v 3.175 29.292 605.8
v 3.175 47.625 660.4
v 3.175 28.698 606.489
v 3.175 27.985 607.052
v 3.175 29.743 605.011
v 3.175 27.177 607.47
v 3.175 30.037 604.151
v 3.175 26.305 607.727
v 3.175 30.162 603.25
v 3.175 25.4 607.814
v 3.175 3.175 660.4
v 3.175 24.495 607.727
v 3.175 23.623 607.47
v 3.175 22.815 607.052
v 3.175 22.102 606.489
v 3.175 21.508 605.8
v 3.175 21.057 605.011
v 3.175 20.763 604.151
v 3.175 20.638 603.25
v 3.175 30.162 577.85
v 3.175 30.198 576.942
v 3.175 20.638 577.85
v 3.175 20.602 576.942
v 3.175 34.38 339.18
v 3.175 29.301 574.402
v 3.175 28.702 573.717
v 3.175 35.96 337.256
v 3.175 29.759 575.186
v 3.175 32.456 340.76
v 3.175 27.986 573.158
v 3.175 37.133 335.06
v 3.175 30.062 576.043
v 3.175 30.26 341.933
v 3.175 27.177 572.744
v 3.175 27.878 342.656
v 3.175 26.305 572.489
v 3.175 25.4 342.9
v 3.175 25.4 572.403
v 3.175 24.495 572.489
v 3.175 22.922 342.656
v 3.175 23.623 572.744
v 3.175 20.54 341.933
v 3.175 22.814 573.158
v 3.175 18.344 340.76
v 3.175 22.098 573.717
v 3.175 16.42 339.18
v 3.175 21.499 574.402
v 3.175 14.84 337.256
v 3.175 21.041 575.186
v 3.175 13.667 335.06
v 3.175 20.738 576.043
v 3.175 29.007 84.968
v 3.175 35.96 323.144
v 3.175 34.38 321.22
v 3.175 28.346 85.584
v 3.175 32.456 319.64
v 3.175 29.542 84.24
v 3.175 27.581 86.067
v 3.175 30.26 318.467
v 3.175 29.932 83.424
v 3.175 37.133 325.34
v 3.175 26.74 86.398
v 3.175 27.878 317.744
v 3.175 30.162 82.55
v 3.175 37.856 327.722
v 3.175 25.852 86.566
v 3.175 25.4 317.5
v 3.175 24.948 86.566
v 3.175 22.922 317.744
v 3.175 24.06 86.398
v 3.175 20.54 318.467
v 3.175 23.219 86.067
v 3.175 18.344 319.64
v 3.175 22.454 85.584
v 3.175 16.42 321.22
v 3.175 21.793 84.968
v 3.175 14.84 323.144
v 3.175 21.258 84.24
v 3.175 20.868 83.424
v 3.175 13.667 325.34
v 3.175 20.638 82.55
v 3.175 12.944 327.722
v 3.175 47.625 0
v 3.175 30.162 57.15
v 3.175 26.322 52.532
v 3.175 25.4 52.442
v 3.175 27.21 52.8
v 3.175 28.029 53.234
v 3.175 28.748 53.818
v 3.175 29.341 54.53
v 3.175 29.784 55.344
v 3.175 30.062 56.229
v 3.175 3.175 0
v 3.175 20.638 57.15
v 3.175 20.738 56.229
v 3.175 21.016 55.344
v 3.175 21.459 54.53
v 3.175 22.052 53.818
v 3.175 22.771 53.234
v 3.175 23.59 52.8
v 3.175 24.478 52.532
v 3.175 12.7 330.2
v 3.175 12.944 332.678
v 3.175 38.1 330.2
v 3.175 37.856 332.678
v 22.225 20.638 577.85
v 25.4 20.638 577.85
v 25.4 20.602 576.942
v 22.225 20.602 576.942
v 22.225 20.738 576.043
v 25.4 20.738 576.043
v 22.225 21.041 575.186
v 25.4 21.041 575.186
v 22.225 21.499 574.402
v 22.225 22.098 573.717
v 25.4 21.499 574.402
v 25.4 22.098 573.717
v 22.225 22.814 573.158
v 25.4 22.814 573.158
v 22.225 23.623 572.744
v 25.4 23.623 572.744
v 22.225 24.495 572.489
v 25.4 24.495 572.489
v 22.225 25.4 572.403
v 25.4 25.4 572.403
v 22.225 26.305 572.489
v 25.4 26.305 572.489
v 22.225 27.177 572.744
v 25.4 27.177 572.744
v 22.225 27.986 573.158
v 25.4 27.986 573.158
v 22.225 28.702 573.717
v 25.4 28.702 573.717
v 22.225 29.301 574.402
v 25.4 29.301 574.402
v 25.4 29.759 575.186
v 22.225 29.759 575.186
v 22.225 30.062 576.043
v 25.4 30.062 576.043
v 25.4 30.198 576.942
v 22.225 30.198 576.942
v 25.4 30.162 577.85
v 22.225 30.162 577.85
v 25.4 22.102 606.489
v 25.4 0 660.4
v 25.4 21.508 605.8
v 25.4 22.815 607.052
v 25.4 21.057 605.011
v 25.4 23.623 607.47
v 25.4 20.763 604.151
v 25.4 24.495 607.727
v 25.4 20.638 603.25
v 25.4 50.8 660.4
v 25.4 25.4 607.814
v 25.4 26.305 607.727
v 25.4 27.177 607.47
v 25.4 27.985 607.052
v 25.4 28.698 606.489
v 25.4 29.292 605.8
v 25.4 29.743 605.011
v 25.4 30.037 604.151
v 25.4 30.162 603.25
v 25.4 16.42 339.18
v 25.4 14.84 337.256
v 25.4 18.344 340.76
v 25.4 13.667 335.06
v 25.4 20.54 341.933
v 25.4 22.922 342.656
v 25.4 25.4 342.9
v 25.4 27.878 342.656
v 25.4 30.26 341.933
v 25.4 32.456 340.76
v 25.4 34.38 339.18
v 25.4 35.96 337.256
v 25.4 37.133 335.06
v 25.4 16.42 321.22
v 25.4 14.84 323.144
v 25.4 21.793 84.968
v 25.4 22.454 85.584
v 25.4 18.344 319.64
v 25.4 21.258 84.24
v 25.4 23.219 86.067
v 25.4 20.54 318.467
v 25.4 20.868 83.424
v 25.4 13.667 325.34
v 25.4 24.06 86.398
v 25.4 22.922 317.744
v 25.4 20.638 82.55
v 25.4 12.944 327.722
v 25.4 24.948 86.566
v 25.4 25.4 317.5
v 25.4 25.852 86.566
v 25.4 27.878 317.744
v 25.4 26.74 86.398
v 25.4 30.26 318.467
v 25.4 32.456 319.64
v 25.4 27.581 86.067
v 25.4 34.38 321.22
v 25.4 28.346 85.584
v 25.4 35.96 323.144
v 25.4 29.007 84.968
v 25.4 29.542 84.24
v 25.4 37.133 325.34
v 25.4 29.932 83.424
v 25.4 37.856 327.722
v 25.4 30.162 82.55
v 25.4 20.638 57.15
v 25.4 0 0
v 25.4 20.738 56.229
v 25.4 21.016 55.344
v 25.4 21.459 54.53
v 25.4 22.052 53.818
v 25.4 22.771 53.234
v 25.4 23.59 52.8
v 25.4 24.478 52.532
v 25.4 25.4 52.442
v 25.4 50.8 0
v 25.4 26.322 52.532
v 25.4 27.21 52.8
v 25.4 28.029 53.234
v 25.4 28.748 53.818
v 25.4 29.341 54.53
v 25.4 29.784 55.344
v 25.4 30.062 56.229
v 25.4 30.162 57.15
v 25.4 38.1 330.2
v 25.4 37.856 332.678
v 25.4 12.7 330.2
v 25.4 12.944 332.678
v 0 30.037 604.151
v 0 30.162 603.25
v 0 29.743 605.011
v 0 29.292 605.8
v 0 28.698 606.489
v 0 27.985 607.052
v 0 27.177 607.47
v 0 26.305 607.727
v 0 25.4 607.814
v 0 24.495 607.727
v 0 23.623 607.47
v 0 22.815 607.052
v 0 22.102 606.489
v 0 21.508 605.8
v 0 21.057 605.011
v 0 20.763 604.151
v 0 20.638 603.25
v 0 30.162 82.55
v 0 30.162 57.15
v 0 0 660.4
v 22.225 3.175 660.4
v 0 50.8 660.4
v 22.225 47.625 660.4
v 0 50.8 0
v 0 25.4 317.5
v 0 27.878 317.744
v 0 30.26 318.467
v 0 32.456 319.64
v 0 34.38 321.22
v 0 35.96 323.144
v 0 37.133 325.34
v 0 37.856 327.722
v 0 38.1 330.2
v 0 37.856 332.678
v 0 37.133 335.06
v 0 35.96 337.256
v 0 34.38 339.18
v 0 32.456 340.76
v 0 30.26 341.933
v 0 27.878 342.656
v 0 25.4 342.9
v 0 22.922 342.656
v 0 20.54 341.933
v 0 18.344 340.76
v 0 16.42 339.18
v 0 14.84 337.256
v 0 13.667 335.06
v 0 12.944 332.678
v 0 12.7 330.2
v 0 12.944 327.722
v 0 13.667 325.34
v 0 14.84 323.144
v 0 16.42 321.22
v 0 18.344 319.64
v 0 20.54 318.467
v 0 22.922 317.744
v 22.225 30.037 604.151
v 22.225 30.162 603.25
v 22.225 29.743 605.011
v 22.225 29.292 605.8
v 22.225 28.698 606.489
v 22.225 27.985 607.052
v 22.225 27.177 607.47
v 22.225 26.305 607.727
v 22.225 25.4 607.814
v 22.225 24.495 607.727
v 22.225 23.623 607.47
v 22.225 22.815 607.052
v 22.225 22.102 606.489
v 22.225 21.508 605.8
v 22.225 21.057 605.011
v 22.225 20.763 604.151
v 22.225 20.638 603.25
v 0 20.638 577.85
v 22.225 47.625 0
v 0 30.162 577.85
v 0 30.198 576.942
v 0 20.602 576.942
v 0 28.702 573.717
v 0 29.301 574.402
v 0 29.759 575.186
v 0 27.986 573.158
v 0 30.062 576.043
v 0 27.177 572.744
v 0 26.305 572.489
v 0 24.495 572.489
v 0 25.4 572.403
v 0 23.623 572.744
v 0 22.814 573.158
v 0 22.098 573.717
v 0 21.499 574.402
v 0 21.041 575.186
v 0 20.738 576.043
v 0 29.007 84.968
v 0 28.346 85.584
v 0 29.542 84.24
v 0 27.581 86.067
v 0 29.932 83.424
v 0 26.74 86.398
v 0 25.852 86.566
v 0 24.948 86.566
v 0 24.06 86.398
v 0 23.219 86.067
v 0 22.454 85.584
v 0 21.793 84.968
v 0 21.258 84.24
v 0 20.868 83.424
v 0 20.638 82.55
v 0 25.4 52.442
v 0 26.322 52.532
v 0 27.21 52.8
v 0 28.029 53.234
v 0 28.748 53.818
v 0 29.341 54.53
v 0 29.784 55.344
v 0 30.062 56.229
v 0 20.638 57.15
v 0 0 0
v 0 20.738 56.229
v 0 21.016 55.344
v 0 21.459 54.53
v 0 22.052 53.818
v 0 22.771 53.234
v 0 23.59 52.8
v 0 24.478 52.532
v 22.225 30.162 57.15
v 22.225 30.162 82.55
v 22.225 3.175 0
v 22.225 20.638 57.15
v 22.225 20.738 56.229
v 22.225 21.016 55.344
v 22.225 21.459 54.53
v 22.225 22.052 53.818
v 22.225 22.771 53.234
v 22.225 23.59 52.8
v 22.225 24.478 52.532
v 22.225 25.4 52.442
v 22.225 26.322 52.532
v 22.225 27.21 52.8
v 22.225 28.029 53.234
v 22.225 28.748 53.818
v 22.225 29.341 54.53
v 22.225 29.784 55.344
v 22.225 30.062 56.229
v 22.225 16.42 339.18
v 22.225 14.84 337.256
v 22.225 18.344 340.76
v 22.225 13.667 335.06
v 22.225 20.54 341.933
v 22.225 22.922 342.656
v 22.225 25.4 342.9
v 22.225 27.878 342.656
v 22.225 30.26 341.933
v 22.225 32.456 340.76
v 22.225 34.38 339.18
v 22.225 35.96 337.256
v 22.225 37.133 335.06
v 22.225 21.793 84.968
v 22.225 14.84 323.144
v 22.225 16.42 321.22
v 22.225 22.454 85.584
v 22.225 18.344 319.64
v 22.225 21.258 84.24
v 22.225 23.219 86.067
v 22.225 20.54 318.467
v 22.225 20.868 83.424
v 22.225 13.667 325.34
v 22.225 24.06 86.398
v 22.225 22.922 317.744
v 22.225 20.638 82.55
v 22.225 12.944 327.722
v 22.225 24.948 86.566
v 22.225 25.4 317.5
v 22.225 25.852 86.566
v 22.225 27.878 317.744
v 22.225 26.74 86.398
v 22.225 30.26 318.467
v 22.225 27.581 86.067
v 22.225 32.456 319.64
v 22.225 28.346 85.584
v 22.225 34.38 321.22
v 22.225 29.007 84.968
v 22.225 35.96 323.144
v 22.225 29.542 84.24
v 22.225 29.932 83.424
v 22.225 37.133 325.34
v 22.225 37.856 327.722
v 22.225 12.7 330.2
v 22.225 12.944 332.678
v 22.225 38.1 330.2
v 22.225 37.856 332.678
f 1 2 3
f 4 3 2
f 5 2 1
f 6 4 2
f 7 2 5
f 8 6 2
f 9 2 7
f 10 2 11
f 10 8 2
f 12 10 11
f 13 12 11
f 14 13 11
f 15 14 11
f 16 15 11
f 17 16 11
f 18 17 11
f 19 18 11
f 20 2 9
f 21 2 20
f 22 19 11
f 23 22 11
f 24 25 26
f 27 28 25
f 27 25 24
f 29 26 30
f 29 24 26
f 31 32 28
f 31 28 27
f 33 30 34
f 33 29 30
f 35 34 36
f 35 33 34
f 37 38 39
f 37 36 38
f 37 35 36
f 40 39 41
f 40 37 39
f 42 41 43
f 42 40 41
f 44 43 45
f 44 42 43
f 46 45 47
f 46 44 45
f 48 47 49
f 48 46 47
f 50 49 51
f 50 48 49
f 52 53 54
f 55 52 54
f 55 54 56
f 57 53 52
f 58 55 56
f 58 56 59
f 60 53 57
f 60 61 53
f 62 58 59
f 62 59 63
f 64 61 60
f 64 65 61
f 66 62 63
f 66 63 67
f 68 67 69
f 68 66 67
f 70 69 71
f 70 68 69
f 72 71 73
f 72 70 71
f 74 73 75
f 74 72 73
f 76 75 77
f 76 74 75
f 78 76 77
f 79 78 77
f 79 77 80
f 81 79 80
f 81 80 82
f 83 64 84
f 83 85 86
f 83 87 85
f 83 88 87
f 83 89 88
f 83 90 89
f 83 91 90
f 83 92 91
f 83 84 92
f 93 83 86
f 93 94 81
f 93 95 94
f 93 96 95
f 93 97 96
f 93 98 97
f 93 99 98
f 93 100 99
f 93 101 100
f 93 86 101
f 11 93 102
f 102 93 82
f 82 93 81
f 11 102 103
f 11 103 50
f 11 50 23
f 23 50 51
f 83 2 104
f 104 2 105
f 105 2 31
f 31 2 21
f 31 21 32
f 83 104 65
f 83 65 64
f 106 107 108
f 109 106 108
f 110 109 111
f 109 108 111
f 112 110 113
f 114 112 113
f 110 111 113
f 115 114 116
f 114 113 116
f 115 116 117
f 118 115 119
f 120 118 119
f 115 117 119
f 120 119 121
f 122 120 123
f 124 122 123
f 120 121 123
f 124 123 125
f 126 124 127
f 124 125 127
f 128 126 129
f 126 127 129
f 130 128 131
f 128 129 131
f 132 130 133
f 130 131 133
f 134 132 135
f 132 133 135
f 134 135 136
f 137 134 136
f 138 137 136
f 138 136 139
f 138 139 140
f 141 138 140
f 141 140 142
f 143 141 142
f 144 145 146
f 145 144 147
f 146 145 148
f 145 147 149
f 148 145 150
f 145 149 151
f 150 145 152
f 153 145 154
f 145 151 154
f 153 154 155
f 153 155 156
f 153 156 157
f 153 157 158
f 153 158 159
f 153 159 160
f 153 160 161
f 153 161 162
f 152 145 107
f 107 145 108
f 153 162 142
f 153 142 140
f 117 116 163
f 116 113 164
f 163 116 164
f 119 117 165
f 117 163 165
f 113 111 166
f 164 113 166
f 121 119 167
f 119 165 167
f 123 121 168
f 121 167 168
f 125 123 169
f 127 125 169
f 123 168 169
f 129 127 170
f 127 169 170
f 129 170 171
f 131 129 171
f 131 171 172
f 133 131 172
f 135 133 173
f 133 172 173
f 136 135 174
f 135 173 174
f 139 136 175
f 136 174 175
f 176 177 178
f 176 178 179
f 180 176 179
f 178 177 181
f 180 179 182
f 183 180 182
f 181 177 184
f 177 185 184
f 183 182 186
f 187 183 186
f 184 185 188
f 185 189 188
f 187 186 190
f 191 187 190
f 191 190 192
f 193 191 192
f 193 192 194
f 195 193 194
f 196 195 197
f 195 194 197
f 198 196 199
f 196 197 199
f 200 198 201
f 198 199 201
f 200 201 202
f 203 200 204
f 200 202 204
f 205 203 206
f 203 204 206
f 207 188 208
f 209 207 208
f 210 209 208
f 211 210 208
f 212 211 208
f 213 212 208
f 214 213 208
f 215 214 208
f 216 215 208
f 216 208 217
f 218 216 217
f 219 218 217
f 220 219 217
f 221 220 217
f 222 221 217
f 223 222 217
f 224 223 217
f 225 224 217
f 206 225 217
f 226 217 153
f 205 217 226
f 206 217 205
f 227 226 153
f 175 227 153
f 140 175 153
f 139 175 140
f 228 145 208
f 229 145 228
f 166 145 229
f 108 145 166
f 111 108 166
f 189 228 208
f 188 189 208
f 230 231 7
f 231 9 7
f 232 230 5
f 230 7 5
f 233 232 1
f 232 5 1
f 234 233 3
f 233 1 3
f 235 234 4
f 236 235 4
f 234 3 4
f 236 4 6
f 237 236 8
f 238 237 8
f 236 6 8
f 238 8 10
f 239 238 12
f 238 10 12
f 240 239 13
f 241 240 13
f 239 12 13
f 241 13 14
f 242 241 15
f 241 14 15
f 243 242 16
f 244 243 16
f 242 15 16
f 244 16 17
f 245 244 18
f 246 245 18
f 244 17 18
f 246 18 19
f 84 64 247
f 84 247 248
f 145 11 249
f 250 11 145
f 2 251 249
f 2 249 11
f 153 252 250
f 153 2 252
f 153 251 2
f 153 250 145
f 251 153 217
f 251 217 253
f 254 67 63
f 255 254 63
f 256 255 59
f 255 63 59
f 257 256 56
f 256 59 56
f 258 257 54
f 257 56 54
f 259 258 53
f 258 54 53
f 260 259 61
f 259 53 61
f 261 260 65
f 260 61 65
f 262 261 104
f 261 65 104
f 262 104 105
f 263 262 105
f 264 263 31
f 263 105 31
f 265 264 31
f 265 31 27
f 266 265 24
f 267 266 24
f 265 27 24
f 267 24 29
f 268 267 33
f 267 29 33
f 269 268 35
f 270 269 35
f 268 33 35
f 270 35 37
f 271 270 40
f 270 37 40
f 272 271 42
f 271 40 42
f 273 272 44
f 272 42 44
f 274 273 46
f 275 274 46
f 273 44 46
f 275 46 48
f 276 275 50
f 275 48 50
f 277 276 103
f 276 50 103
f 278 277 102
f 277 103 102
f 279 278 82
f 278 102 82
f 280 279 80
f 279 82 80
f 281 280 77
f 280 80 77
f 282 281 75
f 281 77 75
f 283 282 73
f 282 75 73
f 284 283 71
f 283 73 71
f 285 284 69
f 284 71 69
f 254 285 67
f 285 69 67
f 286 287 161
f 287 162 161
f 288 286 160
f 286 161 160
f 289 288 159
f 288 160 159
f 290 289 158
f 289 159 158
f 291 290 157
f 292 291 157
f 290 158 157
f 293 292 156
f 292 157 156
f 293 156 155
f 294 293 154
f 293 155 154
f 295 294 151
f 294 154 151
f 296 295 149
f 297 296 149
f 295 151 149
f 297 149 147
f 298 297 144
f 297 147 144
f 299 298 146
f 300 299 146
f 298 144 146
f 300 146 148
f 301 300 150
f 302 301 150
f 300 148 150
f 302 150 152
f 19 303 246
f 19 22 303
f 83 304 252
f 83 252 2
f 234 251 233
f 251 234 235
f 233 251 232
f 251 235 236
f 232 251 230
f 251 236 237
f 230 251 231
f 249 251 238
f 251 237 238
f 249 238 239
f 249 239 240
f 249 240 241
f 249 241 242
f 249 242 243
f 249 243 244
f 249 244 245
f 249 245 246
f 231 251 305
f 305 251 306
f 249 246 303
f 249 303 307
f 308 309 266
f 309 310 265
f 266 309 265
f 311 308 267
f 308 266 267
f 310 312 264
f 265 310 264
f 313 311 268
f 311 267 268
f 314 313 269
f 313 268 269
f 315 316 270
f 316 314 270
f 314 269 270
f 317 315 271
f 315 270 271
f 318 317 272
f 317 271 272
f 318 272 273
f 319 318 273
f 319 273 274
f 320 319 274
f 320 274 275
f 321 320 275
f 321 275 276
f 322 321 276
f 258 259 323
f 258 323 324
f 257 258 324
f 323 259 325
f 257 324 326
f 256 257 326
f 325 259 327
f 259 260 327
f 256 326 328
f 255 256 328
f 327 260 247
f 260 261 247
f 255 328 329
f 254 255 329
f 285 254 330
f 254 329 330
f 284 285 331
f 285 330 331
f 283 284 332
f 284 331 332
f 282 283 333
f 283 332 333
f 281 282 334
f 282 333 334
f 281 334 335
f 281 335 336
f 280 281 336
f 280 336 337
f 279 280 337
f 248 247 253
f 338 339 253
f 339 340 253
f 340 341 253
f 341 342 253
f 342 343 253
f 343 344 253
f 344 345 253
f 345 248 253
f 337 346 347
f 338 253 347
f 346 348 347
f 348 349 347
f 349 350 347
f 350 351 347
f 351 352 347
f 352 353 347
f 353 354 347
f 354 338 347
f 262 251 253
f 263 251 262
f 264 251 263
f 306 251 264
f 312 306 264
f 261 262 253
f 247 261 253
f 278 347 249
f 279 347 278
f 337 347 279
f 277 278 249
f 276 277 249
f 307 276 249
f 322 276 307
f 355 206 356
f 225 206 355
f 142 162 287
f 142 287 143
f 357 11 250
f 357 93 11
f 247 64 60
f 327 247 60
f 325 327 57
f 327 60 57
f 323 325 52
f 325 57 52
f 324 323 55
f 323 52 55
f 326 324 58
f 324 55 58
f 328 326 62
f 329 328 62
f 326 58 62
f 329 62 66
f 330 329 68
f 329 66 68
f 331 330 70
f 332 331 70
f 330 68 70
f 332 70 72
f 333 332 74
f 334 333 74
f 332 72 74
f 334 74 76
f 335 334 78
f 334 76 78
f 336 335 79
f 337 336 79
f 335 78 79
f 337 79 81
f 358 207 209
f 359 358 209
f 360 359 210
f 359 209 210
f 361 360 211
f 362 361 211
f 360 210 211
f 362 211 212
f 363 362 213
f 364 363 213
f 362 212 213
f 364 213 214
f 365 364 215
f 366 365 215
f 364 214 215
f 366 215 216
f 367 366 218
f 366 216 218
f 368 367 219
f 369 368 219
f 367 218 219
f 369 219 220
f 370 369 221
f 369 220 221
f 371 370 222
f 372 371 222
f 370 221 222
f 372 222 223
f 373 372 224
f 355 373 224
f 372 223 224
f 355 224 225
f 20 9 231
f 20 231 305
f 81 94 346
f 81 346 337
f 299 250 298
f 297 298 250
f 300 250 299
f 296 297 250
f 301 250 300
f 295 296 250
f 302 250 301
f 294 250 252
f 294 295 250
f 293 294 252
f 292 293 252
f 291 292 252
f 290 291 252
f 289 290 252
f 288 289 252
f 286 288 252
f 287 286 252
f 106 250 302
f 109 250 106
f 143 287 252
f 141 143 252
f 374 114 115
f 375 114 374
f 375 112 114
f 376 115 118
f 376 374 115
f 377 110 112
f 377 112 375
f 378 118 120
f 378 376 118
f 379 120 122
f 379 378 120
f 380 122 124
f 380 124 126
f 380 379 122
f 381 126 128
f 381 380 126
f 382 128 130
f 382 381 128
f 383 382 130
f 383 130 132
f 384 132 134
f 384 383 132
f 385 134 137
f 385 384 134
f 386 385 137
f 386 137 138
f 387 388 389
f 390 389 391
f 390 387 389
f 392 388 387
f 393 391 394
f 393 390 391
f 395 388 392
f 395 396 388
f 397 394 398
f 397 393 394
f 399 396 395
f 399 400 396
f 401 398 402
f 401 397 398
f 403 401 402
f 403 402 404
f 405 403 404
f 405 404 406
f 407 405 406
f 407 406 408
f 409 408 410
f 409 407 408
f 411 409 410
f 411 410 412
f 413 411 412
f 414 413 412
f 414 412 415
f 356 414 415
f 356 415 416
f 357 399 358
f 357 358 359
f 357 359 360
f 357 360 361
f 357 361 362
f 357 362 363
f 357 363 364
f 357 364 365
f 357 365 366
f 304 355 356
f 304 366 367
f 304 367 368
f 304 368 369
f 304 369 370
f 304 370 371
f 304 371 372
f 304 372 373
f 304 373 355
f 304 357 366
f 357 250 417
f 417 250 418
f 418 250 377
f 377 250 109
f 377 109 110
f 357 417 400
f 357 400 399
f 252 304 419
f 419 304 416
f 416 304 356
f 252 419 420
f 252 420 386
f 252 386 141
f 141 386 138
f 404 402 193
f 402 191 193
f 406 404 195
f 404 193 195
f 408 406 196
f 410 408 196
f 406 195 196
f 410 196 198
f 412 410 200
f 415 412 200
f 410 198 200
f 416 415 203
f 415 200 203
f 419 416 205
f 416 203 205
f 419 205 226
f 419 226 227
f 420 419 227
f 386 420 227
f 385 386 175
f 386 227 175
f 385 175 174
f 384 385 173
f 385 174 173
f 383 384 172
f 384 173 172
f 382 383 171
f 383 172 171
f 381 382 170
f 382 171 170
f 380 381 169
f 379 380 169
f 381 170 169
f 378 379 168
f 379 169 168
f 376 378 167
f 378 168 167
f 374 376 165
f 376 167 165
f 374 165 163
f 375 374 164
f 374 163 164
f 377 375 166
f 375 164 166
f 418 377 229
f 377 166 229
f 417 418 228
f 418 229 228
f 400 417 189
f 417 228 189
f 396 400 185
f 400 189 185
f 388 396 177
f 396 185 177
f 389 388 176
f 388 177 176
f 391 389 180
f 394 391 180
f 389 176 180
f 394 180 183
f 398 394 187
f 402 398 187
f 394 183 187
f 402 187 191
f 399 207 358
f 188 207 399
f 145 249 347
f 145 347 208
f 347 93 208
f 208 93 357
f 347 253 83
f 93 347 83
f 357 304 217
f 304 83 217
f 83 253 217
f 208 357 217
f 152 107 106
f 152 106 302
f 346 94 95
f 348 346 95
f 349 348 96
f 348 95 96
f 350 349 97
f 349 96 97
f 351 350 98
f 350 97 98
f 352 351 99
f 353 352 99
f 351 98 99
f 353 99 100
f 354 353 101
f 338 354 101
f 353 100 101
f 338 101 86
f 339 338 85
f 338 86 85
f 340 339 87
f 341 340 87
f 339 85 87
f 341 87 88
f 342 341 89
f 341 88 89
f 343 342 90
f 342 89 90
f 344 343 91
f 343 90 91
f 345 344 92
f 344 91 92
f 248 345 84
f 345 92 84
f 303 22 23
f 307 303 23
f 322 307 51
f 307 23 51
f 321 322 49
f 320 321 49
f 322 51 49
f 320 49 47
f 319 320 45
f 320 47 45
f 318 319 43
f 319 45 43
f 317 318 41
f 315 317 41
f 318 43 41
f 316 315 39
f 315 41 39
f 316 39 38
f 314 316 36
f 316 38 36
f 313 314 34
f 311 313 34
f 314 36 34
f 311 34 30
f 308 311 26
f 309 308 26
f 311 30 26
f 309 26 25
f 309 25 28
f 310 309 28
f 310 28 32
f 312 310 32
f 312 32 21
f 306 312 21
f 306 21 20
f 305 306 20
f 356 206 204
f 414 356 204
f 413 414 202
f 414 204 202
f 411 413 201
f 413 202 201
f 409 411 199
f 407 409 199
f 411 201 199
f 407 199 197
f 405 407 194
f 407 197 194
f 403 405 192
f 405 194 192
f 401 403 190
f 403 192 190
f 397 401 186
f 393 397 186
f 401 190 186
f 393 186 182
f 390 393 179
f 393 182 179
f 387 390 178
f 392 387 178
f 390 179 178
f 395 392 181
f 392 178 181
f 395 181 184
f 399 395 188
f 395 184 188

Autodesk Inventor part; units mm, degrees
ref_plane "YZ Plane" through (0, 0, 0) normal (1, 0, 0) x (0, 1, 0)
ref_plane "XZ Plane" through (0, 0, 0) normal (0, 1, 0) x (-1, 0, 0)
ref_plane "XY Plane" through (0, 0, 0) normal (0, 0, 1) x (1, 0, 0)
sketch "Sketch1" plane through (0, 0, 0) normal (0, 0, 1) x (1, 0, 0)
  line L0 (0, 0) -> (25.4, 0)
  line L1 (25.4, 0) -> (25.4, 50.8)
  line L2 (25.4, 50.8) -> (0, 50.8)
  line L3 (0, 50.8) -> (0, 0)
  line L4 (3.175, 3.175) -> (22.225, 3.175)
  line L5 (22.225, 3.175) -> (22.225, 47.625)
  line L6 (22.225, 47.625) -> (3.175, 47.625)
  line L7 (3.175, 47.625) -> (3.175, 3.175)
  dimension "d0" = 25.4
  dimension "d1" = 50.8
  dimension "d2" = 19.05
  dimension "d3" = 44.45
  dimension "d4" = 3.175
  dimension "d5" = 3.175
extrude "Extrusion1" add sketch "Sketch1" along normal blind 660.4
sketch "Sketch2" plane through (25.4, 0, 0) normal (1, 0, 0) x (0, 0, -1)
  line L0 (0, 0) -> (0, 50.8) projected
  line L1 (0, 50.8) -> (-660.4, 50.8) projected
  line L2 (-660.4, 0) -> (-660.4, 50.8) projected
  line L3 (0, 0) -> (-660.4, 0) projected
  circle A0 centre (-330.2, 25.4) radius 12.7
  line L4 (-603.25, 25.4) -> (-603.25, 20.6375) construction
  line L5 (-603.25, 20.6375) -> (-603.25, 30.1625) construction
  line L6 (-577.85, 25.4) -> (-577.85, 20.6375) construction
  line L7 (-577.85, 20.6375) -> (-577.85, 30.1625) construction
  line L8 (-82.55, 25.4) -> (-82.55, 20.6375) construction
  line L9 (-82.55, 25.4) -> (-77.7875, 25.4) construction
  line L10 (-82.55, 20.6375) -> (-82.55, 30.1625) construction
  line L11 (-57.15, 25.4) -> (-57.15, 20.6375) construction
  line L12 (-57.15, 25.4) -> (-52.3875, 25.4) construction
  line L13 (-57.15, 20.6375) -> (-57.15, 30.1625) construction
  arc A1 (-603.25, 30.1625) -> (-603.25, 20.6375) centre (-603.047, 25.4) ccw
  arc A2 (-577.85, 20.6375) -> (-577.85, 30.1625) centre (-577.2085, 25.4) ccw
  arc A3 (-82.55, 30.1625) -> (-82.55, 20.6375) centre (-81.7597, 25.4) ccw
  arc A4 (-57.15, 20.6375) -> (-57.15, 30.1625) centre (-57.2051, 25.4) ccw
  line L14 (-82.55, 30.1625) -> (-57.15, 30.1625)
  line L15 (-57.15, 20.6375) -> (-82.55, 20.6375)
  line L16 (-603.25, 30.1625) -> (-577.85, 30.1625)
  line L17 (-577.85, 20.6375) -> (-603.25, 20.6375)
  dimension "d8" = 25.4
  dimension "d9" = 330.2
  dimension "d10" = 25.4
  dimension "d11" = 25.4
  dimension "d12" = 25.4
  dimension "d13" = 25.4
  dimension "d14" = 25.4
  dimension "d15" = 57.15
  dimension "d16" = 57.15
  dimension "d17" = 82.55
  dimension "d18" = 82.55
  dimension "d19" = 4.7625
  dimension "d20" = 9.525
  dimension "d21" = 4.7625
  dimension "d22" = 9.525
  dimension "d23" = 4.7625
  dimension "d24" = 90
  dimension "d25" = 9.525
  dimension "d26" = 4.7625
  dimension "d27" = 90
  dimension "d28" = 9.525
  dimension "d29" = 4.7668
  dimension "d30" = 4.8055
  dimension "d31" = 4.8276
  dimension "d32" = 4.7628
extrude "Extrusion2" cut sketch "Sketch2" against normal blind 762 contours A0 | L16 A2 L17 A1 | L14 A4 L15 A3
properties part number "frame_long"
